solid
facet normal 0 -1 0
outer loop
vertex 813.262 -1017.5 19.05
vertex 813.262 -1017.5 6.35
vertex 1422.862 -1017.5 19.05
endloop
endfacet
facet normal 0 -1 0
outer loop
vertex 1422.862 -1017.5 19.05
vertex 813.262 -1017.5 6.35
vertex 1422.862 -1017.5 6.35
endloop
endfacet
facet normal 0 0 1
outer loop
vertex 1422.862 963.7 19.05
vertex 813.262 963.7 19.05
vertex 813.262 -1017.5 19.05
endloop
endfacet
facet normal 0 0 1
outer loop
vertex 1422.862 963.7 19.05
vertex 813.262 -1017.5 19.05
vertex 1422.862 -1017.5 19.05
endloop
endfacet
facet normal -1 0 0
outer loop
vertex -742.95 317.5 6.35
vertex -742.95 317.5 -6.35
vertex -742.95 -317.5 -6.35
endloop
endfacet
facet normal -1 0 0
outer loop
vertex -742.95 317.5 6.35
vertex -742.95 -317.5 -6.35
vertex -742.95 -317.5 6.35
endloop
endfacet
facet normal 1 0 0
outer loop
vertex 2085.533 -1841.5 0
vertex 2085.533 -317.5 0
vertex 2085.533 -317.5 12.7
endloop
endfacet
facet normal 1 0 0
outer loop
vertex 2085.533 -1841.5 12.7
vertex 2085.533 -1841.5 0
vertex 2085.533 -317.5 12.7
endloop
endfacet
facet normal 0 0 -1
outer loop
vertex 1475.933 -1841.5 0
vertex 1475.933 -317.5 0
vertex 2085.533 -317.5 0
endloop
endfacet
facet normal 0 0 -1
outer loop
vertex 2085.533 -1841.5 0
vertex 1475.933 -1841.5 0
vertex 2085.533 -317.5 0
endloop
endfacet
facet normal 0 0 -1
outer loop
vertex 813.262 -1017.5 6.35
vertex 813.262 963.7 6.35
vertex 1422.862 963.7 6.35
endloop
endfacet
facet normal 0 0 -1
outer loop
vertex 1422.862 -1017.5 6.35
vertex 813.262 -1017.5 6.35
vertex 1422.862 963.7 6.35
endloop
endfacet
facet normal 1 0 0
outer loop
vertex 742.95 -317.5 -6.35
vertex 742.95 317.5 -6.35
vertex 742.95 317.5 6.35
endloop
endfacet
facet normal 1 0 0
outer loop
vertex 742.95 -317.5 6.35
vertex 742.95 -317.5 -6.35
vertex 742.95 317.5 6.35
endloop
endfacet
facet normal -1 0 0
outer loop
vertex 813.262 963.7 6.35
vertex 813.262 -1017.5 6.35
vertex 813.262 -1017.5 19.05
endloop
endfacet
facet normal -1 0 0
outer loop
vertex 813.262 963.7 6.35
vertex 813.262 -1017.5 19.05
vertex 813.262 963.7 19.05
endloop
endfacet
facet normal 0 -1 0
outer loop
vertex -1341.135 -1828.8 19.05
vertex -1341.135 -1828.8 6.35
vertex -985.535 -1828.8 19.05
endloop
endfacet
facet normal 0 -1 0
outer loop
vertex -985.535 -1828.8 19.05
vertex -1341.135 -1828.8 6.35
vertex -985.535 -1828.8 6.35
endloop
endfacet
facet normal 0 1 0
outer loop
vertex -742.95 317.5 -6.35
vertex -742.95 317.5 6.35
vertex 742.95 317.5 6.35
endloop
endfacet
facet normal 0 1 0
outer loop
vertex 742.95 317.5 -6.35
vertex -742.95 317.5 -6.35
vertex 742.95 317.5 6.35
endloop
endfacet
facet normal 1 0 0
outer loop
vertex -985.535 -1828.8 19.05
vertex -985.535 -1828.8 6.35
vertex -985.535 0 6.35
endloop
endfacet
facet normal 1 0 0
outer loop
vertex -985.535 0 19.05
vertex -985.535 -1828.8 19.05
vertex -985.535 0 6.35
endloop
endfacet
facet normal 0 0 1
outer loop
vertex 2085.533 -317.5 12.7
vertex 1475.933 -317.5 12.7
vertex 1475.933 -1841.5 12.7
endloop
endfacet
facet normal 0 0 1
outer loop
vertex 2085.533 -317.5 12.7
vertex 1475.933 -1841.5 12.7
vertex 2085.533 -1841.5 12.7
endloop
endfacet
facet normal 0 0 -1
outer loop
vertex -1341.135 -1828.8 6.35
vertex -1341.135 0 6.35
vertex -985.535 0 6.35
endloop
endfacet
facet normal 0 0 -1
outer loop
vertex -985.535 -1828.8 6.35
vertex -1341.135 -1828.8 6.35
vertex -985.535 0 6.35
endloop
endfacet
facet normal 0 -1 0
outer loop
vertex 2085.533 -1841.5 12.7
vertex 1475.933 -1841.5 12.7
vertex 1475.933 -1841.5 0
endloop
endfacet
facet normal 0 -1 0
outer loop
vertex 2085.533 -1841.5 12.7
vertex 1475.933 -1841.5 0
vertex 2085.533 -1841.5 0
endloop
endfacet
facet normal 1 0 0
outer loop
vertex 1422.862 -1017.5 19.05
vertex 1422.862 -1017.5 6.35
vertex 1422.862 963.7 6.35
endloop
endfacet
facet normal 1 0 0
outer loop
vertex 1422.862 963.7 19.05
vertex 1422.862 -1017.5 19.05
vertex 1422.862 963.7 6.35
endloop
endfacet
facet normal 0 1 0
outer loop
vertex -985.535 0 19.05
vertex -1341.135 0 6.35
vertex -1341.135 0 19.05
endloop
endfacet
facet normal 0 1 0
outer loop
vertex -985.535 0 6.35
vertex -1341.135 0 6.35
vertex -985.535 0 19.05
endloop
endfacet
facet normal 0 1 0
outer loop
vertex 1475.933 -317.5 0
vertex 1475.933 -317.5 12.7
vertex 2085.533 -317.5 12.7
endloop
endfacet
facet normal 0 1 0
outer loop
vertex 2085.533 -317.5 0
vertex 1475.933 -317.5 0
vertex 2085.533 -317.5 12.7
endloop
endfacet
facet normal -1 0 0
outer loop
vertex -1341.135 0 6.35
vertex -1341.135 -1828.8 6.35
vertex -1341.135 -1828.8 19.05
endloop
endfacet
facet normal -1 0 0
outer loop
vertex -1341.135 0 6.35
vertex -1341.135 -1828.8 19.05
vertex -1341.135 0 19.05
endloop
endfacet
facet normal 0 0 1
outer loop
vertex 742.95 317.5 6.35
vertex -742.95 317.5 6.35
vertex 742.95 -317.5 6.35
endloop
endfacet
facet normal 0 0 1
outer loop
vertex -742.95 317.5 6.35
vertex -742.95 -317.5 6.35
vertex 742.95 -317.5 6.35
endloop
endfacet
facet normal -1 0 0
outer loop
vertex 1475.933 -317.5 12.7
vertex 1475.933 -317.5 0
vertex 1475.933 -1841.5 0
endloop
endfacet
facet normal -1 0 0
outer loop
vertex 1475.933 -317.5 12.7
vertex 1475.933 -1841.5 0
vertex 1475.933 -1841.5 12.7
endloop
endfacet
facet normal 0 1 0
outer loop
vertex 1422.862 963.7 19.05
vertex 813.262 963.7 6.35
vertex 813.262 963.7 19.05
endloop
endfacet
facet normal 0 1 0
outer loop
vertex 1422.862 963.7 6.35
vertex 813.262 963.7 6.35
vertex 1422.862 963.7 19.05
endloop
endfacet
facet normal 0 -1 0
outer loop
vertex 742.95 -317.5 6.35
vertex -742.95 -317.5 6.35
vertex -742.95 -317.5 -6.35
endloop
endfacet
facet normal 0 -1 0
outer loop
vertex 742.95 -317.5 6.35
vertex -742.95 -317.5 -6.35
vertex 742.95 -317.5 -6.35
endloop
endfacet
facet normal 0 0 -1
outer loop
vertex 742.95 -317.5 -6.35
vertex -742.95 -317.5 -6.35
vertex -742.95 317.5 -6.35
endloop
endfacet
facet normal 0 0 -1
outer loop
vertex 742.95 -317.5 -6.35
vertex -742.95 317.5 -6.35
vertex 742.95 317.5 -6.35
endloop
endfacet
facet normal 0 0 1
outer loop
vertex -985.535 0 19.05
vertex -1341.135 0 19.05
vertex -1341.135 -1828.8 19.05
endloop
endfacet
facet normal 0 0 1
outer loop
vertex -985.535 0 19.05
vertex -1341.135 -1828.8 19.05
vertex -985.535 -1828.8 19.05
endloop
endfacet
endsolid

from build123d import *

# Parameters (mm, degrees)
F0_W     = 1485.9
F0_H     = 12.7
F1_DEPTH = 317.5
F2_W     = 609.6
F2_H     = 1981.2
F3_DEPTH = 12.7
F4_W     = 355.6
F4_H     = 1828.8
F5_DEPTH = 12.7
F6_W     = 609.6
F6_H     = 12.7
F7_DEPTH = 1524


with BuildPart() as f1:
    # F0 (on Front) → F1 (new body, symmetric)
    with BuildSketch(Plane.XZ):
        Rectangle(F0_W, F0_H)
    extrude(amount=F1_DEPTH, both=True)


with BuildPart() as f3:
    # F2 (on face) → F3 (new body)
    with BuildSketch(Plane.XY.offset(6.35)):
        with Locations((1118.062125, -26.900185)):
            Rectangle(F2_W, F2_H)
    extrude(amount=F3_DEPTH)


with BuildPart() as f5:
    # F4 (on face) → F5 (new body)
    with BuildSketch(Plane.XY.offset(6.35)):
        with Locations((-1163.335383, -914.4)):
            Rectangle(F4_W, F4_H)
    extrude(amount=F5_DEPTH)


with BuildPart() as f7:
    # F6 (on face) → F7 (new body)
    with BuildSketch(Plane.XZ.offset(317.5)):
        with Locations((1780.732717, 6.35)):
            Rectangle(F6_W, F6_H)
    extrude(amount=F7_DEPTH)


solid = Compound([f1.part, f3.part, f5.part, f7.part])
